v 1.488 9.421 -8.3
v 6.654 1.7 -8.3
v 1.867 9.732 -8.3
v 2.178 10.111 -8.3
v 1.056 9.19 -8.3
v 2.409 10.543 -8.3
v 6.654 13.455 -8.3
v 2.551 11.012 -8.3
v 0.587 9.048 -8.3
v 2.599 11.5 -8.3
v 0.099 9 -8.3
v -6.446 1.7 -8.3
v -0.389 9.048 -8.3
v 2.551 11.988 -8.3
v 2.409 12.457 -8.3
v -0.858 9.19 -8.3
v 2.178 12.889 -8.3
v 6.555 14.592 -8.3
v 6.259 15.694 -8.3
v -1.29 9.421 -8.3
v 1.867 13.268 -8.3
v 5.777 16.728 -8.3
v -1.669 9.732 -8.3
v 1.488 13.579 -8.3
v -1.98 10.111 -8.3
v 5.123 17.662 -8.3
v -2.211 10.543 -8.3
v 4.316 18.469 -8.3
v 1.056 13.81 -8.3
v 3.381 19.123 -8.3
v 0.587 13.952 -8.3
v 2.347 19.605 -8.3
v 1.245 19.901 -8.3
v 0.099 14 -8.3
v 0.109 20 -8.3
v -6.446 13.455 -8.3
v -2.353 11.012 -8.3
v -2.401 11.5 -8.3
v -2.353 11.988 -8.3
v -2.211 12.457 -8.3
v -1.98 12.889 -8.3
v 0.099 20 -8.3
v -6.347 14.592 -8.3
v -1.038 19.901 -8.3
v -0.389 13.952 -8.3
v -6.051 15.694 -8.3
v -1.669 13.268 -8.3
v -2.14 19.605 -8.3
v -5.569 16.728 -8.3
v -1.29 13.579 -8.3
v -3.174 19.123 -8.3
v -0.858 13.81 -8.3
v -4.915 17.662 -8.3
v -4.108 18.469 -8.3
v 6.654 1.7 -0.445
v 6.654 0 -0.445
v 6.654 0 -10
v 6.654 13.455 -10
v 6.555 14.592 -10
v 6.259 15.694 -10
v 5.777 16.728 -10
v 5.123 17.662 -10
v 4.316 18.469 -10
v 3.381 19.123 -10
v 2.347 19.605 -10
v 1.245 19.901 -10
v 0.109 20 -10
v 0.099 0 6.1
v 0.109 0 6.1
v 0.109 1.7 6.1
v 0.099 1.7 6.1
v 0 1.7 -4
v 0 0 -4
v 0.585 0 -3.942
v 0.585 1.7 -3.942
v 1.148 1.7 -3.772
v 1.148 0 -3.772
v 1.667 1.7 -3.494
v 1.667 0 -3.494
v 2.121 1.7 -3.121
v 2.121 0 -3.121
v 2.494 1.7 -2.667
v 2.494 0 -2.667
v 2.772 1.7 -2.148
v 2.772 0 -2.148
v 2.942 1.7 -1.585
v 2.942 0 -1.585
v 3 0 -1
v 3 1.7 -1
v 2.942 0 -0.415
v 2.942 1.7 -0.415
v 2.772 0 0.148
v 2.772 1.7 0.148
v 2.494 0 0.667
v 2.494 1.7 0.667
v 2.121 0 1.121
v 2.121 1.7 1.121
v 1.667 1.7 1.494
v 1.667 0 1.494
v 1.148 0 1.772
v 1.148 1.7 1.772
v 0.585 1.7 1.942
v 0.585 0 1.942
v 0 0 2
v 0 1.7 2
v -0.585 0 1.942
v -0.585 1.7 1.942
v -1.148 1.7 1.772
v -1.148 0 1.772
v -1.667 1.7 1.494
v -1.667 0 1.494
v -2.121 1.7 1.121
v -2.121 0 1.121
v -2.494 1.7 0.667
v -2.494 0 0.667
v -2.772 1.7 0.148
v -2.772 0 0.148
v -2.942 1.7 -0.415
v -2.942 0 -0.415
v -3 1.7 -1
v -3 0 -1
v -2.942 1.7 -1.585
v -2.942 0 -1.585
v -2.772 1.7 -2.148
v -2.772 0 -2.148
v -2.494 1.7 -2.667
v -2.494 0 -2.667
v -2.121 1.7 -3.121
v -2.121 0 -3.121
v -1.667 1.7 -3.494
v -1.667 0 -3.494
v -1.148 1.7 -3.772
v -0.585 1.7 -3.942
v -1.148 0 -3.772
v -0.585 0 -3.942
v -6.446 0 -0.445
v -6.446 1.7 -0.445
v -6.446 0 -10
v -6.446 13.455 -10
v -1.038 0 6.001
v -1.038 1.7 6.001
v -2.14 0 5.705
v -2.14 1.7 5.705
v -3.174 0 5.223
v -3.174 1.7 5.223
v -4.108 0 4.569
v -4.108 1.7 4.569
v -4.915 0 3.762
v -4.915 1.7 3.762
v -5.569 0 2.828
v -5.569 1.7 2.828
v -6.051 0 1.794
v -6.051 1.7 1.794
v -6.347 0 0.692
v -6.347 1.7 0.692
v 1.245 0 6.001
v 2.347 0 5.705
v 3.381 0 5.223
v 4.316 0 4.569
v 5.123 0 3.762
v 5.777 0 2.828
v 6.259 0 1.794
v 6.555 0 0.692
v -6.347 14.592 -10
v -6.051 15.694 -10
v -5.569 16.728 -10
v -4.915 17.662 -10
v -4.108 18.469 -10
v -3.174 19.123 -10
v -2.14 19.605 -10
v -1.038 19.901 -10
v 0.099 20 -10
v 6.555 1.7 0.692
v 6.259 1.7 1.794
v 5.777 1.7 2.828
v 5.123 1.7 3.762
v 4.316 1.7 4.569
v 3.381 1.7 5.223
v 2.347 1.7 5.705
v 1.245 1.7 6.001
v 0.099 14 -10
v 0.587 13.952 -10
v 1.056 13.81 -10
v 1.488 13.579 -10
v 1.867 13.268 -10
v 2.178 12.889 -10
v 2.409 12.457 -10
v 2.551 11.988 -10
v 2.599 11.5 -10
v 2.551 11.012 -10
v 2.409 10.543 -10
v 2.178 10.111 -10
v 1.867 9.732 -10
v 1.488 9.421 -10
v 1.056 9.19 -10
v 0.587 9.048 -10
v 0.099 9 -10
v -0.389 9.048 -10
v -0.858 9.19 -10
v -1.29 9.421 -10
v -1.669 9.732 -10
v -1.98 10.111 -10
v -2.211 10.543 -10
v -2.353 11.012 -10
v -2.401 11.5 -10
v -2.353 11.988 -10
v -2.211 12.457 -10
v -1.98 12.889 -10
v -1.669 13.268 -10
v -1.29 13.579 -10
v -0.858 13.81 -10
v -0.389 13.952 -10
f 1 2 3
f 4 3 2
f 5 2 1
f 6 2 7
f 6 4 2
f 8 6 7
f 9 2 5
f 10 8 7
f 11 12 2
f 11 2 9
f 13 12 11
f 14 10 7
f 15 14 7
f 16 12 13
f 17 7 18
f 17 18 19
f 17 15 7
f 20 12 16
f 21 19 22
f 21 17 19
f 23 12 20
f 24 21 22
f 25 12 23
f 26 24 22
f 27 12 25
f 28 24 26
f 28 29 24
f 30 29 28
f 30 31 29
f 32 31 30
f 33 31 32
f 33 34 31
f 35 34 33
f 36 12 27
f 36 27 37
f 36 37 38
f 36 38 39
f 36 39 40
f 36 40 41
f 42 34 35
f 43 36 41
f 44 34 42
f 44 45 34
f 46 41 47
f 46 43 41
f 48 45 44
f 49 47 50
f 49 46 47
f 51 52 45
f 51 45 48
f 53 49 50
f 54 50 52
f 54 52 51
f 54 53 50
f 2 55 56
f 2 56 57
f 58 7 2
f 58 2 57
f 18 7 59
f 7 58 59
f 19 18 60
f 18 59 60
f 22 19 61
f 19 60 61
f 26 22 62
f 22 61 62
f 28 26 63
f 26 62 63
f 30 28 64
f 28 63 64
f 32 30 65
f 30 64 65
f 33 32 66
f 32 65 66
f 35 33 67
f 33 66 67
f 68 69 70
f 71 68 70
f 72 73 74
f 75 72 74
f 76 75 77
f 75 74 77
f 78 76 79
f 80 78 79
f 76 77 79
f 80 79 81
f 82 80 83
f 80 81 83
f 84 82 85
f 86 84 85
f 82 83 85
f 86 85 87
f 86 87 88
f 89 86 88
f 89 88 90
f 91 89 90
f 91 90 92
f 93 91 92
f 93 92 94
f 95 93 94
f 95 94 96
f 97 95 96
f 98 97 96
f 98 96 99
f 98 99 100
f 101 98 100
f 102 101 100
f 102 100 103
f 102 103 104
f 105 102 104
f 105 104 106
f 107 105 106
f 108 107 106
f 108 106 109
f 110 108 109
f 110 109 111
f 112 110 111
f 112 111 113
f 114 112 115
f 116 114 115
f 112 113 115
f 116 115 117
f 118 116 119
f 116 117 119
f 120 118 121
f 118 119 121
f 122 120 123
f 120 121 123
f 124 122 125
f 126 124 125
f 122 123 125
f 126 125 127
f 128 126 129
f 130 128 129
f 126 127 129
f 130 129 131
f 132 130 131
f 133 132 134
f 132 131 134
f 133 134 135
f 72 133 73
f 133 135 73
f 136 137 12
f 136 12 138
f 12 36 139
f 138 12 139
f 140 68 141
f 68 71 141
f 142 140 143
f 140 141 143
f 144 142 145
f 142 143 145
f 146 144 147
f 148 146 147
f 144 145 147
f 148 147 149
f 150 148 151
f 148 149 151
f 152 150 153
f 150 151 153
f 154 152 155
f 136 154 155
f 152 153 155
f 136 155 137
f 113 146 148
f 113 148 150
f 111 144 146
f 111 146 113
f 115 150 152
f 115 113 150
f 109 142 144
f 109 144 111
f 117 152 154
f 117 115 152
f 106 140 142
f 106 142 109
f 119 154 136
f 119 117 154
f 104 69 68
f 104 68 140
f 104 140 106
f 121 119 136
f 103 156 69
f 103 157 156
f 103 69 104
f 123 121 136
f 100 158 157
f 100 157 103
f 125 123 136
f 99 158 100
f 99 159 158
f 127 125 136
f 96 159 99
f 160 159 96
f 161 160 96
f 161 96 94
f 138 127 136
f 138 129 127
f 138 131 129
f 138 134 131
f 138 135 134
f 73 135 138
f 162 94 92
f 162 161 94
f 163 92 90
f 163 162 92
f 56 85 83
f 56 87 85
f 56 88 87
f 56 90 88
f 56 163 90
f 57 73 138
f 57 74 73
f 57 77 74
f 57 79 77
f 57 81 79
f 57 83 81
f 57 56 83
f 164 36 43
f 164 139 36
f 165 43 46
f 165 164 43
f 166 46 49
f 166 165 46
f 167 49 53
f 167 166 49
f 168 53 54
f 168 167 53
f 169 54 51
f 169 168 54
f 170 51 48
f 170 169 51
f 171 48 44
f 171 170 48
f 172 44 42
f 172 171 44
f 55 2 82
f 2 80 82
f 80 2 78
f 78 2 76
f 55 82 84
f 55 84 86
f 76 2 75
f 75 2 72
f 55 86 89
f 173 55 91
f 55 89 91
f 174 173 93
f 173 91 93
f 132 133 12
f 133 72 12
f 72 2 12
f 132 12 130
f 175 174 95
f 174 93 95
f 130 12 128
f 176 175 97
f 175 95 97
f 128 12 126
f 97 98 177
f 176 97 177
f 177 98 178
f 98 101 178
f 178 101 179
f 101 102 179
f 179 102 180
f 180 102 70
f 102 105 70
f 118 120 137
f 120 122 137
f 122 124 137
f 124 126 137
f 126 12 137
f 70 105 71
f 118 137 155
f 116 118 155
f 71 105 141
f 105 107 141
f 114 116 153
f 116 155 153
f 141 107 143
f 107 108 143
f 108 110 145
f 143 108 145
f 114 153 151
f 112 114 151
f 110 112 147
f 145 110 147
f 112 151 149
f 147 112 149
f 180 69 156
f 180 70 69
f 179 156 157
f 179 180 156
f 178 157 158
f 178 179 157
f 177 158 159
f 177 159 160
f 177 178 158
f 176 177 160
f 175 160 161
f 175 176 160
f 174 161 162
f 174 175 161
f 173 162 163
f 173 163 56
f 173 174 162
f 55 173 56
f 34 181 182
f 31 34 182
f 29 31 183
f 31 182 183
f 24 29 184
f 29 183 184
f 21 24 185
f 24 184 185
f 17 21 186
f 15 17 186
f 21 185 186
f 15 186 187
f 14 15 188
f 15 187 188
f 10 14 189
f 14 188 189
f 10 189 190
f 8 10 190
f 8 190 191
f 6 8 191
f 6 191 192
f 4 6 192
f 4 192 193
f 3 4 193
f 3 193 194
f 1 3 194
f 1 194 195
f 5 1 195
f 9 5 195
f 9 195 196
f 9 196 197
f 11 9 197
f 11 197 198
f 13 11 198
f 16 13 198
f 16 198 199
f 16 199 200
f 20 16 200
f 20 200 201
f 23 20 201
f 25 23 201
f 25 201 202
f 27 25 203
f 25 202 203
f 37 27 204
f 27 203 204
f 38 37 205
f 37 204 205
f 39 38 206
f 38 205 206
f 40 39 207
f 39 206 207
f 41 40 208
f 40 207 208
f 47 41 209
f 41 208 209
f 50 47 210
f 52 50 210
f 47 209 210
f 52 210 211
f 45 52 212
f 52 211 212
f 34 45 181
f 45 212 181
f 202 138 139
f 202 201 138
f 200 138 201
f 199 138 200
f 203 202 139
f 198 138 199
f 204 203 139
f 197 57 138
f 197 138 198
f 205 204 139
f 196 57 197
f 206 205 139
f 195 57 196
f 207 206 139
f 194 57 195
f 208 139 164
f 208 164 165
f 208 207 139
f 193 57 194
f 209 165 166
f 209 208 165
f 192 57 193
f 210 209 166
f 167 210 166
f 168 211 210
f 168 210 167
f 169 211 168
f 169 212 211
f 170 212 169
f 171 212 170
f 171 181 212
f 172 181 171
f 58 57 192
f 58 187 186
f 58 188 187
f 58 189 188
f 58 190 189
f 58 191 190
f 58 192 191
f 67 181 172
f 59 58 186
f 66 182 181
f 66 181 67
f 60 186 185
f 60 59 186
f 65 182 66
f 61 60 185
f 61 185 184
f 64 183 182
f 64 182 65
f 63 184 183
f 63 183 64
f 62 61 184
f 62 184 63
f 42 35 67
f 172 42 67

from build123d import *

# Parameters (mm, degrees)
SKETCH1_W           = 16.1
SKETCH1_H           = 20
BOSS_EXTRUDE1_DEPTH = 13.1
SKETCH2_W           = 14.4
SKETCH2_H           = 18.3
CUT_EXTRUDE1_DEPTH  = 26.915439414
FILLET1_R           = 6.545
SKETCH20_R          = 3
CUT_EXTRUDE2_DEPTH  = 10
SKETCH21_R          = 2.5
CUT_EXTRUDE3_DEPTH  = 10


with BuildPart() as part:
    # Sketch1 → Boss-Extrude1 (new body)
    with BuildSketch(Plane(origin=(6.653968254, 0, 0), x_dir=(0, 0, -1), z_dir=(1, 0, 0))):
        with Locations((1.95, 10)):
            Rectangle(SKETCH1_W, SKETCH1_H)
    extrude(amount=-BOSS_EXTRUDE1_DEPTH)

    # Sketch2 → Cut-Extrude1 (cut, through all)
    with BuildSketch(Plane.ZY.offset(6.446031746)):
        with Locations((-1.1, 10.85)):
            Rectangle(SKETCH2_W, SKETCH2_H)
    extrude(amount=-CUT_EXTRUDE1_DEPTH, mode=Mode.SUBTRACT)

    # Fillet1
    fillet1_edges = [part.edges().sort_by_distance(p)[0] for p in [
        (-6.446031746, 20, -9.15),
        (6.653968254, 0.85, 6.1),
        (-6.446031746, 0.85, 6.1),
        (6.653968254, 20, -9.15),
    ]]
    fillet(fillet1_edges, radius=FILLET1_R)

    # Sketch20 → Cut-Extrude2 (cut)
    with BuildSketch(Plane.XZ):
        with Locations(Location((0, -1, 0), (0, 0, 270))):
            Circle(SKETCH20_R)
    extrude(amount=-CUT_EXTRUDE2_DEPTH, mode=Mode.SUBTRACT)

    # Sketch21 → Cut-Extrude3 (cut)
    with BuildSketch(Plane(origin=(0, 0, -10), x_dir=(-1, 0, 0), z_dir=(0, 0, -1))):
        with Locations(Location((-0.098968254, 11.5, 0), (0, 0, 90))):
            Circle(SKETCH21_R)
    extrude(amount=-CUT_EXTRUDE3_DEPTH, mode=Mode.SUBTRACT)


solid = part.part
